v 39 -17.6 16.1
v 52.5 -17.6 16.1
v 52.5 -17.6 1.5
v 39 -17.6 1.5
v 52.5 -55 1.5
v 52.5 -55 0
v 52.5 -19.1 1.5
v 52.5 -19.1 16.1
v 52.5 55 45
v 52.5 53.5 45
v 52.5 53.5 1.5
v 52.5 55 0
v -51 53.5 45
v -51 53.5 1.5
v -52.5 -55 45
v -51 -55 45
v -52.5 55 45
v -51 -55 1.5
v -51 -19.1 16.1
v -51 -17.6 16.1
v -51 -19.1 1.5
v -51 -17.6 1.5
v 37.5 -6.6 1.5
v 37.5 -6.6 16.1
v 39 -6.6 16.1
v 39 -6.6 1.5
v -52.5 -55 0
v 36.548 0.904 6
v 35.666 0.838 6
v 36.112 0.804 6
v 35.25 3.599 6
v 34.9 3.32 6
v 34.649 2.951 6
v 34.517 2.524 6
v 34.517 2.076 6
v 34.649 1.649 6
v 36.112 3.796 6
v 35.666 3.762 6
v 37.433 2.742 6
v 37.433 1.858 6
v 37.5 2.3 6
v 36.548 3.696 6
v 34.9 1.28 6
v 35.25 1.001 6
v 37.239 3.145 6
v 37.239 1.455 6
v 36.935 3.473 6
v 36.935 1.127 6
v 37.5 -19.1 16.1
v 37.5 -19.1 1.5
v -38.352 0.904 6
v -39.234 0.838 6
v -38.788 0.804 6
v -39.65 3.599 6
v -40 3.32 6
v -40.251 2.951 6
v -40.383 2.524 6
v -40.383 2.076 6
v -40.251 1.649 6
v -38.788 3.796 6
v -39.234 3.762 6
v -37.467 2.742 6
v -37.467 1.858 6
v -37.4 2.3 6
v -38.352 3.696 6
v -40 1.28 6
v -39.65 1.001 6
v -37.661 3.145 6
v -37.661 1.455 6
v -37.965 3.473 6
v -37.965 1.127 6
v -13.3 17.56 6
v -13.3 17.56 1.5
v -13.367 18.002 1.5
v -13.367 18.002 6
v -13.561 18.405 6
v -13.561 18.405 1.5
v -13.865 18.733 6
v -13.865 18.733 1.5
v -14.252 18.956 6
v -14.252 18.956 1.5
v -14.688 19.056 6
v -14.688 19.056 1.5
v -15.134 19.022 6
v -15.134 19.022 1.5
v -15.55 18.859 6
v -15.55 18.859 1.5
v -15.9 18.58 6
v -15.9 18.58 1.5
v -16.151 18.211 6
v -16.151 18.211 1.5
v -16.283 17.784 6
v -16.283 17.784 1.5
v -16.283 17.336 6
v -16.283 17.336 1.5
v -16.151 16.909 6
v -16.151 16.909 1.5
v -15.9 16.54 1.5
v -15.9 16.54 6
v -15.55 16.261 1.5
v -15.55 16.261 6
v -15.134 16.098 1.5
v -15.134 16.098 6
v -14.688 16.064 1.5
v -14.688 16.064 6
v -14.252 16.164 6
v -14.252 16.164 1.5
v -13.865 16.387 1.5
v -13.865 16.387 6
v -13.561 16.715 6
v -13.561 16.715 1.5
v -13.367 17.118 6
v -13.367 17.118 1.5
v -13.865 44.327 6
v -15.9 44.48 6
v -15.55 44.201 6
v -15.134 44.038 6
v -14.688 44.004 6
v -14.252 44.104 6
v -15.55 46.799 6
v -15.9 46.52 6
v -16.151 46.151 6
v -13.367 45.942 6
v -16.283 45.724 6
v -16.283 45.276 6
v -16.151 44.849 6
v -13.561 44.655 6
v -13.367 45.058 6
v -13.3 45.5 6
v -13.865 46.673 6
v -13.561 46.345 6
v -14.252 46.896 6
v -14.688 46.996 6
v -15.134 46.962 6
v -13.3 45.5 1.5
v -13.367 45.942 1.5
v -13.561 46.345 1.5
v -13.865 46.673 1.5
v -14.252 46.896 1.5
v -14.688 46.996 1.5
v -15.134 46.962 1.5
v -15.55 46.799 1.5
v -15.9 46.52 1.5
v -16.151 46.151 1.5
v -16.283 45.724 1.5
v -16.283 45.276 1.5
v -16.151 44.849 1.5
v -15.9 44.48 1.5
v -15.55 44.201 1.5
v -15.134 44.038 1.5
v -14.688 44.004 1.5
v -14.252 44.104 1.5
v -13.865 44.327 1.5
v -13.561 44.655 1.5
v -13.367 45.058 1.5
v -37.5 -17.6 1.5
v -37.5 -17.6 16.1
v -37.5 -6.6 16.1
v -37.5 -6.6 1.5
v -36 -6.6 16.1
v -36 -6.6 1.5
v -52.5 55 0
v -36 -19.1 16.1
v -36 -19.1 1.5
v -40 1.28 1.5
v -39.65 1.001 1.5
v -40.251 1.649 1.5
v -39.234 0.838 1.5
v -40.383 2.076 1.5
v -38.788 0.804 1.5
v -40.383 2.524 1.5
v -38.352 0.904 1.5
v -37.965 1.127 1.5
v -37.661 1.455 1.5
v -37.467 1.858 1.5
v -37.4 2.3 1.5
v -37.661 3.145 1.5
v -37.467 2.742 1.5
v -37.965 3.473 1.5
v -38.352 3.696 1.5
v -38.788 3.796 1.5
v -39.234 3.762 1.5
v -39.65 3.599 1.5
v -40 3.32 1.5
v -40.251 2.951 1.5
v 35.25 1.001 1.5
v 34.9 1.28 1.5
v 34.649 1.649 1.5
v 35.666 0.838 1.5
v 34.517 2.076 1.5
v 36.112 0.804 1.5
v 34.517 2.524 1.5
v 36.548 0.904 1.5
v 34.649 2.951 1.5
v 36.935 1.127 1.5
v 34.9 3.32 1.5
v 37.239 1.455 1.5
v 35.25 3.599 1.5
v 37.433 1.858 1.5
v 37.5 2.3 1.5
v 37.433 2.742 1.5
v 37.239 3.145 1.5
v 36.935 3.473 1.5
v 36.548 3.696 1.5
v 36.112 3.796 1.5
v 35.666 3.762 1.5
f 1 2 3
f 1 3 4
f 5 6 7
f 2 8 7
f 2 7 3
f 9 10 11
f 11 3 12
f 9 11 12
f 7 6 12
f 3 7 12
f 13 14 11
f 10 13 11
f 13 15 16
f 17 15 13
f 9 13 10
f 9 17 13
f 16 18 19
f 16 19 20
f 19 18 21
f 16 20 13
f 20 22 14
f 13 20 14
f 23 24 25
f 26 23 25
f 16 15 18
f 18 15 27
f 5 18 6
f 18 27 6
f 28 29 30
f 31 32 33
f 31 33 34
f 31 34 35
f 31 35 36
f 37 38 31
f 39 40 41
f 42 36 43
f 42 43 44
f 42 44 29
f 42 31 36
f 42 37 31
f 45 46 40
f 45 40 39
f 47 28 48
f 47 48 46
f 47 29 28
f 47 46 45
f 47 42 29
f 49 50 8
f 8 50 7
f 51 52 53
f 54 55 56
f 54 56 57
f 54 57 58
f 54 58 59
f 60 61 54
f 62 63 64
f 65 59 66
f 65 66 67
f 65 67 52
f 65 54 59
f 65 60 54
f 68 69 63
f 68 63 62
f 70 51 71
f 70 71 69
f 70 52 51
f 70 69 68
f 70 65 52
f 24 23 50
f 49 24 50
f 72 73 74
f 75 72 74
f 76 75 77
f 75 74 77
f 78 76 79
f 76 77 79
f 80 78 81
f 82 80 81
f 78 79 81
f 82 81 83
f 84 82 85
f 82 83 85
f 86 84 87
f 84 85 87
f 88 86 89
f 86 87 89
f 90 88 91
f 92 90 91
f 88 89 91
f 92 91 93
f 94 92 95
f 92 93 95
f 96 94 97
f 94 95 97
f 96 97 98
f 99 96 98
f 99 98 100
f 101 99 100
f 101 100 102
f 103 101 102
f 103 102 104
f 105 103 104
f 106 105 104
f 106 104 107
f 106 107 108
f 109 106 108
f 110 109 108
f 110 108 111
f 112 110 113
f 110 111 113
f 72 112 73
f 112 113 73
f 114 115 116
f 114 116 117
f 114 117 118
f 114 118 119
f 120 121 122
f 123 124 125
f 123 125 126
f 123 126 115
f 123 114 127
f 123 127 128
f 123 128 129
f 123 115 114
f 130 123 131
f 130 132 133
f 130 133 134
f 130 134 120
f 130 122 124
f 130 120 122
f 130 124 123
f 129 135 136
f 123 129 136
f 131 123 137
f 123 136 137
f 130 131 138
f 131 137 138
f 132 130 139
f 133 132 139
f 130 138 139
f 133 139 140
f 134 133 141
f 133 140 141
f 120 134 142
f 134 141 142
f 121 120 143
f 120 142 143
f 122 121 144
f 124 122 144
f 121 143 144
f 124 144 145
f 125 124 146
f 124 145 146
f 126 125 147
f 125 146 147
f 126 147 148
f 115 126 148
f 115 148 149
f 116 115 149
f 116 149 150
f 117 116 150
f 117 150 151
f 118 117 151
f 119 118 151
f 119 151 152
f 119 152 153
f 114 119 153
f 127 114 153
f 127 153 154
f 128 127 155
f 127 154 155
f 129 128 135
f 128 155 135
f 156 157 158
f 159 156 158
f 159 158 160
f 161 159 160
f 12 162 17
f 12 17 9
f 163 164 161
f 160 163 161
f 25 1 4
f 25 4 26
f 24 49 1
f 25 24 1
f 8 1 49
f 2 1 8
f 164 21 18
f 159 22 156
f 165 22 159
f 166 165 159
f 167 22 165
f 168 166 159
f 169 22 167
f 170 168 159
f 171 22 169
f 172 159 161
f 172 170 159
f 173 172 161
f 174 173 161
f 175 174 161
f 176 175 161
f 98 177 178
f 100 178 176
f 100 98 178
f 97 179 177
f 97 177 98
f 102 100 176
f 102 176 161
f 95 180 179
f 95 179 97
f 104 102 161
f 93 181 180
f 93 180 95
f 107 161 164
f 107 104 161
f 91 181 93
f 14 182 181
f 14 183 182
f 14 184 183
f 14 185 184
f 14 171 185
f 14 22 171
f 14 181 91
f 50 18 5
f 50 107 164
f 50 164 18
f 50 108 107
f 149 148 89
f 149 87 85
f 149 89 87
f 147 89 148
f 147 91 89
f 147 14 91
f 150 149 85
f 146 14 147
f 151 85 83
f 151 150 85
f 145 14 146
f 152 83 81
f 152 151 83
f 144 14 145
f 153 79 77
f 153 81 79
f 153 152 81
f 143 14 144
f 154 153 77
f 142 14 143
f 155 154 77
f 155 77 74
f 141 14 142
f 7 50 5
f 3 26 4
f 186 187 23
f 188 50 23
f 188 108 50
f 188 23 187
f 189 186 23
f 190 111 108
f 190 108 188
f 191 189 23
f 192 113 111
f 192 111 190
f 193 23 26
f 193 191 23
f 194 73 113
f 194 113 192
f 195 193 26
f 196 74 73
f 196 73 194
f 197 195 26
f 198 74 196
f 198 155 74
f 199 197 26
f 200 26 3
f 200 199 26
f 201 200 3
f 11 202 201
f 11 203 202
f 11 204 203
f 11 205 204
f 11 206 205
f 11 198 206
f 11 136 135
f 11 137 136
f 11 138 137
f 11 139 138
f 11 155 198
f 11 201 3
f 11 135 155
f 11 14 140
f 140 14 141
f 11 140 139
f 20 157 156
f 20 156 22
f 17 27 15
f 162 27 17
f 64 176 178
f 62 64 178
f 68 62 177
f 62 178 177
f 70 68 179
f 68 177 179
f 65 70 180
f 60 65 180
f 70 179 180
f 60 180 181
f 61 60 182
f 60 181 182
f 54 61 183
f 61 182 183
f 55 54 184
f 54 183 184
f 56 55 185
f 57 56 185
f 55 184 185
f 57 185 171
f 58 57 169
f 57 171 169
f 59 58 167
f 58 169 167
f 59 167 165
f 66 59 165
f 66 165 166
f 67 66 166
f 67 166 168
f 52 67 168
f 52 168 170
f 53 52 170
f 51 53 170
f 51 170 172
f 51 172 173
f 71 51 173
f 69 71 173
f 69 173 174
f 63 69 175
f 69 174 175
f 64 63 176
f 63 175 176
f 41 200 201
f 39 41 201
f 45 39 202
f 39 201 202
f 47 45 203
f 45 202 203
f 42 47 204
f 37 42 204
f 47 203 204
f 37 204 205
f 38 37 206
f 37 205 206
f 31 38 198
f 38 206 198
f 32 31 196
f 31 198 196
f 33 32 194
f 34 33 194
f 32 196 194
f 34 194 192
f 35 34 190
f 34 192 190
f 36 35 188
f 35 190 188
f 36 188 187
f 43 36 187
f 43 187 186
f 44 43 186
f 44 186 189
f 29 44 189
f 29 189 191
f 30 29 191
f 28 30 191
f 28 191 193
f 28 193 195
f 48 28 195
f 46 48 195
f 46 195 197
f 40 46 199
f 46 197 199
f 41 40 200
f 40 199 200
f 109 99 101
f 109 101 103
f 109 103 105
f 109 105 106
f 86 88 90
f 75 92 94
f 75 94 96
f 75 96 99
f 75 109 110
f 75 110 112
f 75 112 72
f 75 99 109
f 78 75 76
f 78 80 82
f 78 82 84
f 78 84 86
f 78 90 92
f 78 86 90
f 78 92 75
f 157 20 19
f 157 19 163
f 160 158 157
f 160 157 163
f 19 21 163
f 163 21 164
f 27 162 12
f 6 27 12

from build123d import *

# Parameters (mm, degrees)
F0_W     = 105
F0_H     = 110
F1_DEPTH = 1.5
F2_W     = 105
F2_H     = 1.5
F3_DEPTH = 43.5
F4_W     = 1.5
F4_H     = 108.5
F5_DEPTH = 43.5
F6_R     = 1.5
F7_DEPTH = 4.5
F8_W     = 1.5
F8_H     = 11
F9_DEPTH = 14.6


with BuildPart() as f1:
    # F0 (on Top) → F1 (new body)
    with BuildSketch(Plane.XY):
        Rectangle(F0_W, F0_H)
    extrude(amount=F1_DEPTH)

    # F2 (on face) → F3 (join)
    with BuildSketch(Plane.XY.offset(1.5)):
        with Locations((0, 54.25)):
            Rectangle(F2_W, F2_H)
    extrude(amount=F3_DEPTH)

    # F4 (on face) → F5 (join)
    with BuildSketch(Plane.XY.offset(1.5)):
        with Locations((-51.75, -0.75)):
            Rectangle(F4_W, F4_H)
    extrude(amount=F5_DEPTH)

    # F6 (on face) → F7 (join)
    with BuildSketch(Plane.XY.offset(1.5)):
        with Locations((-14.8, 45.5)):
            Circle(F6_R)
        with Locations((-14.8, 17.56)):
            Circle(F6_R)
        with Locations((-38.9, 2.3)):
            Circle(F6_R)
        with Locations((36, 2.3)):
            Circle(F6_R)
    extrude(amount=F7_DEPTH)

    # F8 (on face) → F9 (join)
    with BuildSketch(Plane.XY.offset(1.5)):
        Polygon((-37.5, -17.6), (-51, -17.6), (-51, -19.1), (-36, -19.1), (-36, -17.6), align=None)
        with Locations((-36.75, -12.1)):
            Rectangle(F8_W, F8_H)
        Polygon((37.5, -19.1), (52.5, -19.1), (52.5, -17.6), (39, -17.6), (37.5, -17.6), align=None)
        with Locations((38.25, -12.1)):
            Rectangle(F8_W, F8_H)
    extrude(amount=F9_DEPTH)


solid = f1.part
